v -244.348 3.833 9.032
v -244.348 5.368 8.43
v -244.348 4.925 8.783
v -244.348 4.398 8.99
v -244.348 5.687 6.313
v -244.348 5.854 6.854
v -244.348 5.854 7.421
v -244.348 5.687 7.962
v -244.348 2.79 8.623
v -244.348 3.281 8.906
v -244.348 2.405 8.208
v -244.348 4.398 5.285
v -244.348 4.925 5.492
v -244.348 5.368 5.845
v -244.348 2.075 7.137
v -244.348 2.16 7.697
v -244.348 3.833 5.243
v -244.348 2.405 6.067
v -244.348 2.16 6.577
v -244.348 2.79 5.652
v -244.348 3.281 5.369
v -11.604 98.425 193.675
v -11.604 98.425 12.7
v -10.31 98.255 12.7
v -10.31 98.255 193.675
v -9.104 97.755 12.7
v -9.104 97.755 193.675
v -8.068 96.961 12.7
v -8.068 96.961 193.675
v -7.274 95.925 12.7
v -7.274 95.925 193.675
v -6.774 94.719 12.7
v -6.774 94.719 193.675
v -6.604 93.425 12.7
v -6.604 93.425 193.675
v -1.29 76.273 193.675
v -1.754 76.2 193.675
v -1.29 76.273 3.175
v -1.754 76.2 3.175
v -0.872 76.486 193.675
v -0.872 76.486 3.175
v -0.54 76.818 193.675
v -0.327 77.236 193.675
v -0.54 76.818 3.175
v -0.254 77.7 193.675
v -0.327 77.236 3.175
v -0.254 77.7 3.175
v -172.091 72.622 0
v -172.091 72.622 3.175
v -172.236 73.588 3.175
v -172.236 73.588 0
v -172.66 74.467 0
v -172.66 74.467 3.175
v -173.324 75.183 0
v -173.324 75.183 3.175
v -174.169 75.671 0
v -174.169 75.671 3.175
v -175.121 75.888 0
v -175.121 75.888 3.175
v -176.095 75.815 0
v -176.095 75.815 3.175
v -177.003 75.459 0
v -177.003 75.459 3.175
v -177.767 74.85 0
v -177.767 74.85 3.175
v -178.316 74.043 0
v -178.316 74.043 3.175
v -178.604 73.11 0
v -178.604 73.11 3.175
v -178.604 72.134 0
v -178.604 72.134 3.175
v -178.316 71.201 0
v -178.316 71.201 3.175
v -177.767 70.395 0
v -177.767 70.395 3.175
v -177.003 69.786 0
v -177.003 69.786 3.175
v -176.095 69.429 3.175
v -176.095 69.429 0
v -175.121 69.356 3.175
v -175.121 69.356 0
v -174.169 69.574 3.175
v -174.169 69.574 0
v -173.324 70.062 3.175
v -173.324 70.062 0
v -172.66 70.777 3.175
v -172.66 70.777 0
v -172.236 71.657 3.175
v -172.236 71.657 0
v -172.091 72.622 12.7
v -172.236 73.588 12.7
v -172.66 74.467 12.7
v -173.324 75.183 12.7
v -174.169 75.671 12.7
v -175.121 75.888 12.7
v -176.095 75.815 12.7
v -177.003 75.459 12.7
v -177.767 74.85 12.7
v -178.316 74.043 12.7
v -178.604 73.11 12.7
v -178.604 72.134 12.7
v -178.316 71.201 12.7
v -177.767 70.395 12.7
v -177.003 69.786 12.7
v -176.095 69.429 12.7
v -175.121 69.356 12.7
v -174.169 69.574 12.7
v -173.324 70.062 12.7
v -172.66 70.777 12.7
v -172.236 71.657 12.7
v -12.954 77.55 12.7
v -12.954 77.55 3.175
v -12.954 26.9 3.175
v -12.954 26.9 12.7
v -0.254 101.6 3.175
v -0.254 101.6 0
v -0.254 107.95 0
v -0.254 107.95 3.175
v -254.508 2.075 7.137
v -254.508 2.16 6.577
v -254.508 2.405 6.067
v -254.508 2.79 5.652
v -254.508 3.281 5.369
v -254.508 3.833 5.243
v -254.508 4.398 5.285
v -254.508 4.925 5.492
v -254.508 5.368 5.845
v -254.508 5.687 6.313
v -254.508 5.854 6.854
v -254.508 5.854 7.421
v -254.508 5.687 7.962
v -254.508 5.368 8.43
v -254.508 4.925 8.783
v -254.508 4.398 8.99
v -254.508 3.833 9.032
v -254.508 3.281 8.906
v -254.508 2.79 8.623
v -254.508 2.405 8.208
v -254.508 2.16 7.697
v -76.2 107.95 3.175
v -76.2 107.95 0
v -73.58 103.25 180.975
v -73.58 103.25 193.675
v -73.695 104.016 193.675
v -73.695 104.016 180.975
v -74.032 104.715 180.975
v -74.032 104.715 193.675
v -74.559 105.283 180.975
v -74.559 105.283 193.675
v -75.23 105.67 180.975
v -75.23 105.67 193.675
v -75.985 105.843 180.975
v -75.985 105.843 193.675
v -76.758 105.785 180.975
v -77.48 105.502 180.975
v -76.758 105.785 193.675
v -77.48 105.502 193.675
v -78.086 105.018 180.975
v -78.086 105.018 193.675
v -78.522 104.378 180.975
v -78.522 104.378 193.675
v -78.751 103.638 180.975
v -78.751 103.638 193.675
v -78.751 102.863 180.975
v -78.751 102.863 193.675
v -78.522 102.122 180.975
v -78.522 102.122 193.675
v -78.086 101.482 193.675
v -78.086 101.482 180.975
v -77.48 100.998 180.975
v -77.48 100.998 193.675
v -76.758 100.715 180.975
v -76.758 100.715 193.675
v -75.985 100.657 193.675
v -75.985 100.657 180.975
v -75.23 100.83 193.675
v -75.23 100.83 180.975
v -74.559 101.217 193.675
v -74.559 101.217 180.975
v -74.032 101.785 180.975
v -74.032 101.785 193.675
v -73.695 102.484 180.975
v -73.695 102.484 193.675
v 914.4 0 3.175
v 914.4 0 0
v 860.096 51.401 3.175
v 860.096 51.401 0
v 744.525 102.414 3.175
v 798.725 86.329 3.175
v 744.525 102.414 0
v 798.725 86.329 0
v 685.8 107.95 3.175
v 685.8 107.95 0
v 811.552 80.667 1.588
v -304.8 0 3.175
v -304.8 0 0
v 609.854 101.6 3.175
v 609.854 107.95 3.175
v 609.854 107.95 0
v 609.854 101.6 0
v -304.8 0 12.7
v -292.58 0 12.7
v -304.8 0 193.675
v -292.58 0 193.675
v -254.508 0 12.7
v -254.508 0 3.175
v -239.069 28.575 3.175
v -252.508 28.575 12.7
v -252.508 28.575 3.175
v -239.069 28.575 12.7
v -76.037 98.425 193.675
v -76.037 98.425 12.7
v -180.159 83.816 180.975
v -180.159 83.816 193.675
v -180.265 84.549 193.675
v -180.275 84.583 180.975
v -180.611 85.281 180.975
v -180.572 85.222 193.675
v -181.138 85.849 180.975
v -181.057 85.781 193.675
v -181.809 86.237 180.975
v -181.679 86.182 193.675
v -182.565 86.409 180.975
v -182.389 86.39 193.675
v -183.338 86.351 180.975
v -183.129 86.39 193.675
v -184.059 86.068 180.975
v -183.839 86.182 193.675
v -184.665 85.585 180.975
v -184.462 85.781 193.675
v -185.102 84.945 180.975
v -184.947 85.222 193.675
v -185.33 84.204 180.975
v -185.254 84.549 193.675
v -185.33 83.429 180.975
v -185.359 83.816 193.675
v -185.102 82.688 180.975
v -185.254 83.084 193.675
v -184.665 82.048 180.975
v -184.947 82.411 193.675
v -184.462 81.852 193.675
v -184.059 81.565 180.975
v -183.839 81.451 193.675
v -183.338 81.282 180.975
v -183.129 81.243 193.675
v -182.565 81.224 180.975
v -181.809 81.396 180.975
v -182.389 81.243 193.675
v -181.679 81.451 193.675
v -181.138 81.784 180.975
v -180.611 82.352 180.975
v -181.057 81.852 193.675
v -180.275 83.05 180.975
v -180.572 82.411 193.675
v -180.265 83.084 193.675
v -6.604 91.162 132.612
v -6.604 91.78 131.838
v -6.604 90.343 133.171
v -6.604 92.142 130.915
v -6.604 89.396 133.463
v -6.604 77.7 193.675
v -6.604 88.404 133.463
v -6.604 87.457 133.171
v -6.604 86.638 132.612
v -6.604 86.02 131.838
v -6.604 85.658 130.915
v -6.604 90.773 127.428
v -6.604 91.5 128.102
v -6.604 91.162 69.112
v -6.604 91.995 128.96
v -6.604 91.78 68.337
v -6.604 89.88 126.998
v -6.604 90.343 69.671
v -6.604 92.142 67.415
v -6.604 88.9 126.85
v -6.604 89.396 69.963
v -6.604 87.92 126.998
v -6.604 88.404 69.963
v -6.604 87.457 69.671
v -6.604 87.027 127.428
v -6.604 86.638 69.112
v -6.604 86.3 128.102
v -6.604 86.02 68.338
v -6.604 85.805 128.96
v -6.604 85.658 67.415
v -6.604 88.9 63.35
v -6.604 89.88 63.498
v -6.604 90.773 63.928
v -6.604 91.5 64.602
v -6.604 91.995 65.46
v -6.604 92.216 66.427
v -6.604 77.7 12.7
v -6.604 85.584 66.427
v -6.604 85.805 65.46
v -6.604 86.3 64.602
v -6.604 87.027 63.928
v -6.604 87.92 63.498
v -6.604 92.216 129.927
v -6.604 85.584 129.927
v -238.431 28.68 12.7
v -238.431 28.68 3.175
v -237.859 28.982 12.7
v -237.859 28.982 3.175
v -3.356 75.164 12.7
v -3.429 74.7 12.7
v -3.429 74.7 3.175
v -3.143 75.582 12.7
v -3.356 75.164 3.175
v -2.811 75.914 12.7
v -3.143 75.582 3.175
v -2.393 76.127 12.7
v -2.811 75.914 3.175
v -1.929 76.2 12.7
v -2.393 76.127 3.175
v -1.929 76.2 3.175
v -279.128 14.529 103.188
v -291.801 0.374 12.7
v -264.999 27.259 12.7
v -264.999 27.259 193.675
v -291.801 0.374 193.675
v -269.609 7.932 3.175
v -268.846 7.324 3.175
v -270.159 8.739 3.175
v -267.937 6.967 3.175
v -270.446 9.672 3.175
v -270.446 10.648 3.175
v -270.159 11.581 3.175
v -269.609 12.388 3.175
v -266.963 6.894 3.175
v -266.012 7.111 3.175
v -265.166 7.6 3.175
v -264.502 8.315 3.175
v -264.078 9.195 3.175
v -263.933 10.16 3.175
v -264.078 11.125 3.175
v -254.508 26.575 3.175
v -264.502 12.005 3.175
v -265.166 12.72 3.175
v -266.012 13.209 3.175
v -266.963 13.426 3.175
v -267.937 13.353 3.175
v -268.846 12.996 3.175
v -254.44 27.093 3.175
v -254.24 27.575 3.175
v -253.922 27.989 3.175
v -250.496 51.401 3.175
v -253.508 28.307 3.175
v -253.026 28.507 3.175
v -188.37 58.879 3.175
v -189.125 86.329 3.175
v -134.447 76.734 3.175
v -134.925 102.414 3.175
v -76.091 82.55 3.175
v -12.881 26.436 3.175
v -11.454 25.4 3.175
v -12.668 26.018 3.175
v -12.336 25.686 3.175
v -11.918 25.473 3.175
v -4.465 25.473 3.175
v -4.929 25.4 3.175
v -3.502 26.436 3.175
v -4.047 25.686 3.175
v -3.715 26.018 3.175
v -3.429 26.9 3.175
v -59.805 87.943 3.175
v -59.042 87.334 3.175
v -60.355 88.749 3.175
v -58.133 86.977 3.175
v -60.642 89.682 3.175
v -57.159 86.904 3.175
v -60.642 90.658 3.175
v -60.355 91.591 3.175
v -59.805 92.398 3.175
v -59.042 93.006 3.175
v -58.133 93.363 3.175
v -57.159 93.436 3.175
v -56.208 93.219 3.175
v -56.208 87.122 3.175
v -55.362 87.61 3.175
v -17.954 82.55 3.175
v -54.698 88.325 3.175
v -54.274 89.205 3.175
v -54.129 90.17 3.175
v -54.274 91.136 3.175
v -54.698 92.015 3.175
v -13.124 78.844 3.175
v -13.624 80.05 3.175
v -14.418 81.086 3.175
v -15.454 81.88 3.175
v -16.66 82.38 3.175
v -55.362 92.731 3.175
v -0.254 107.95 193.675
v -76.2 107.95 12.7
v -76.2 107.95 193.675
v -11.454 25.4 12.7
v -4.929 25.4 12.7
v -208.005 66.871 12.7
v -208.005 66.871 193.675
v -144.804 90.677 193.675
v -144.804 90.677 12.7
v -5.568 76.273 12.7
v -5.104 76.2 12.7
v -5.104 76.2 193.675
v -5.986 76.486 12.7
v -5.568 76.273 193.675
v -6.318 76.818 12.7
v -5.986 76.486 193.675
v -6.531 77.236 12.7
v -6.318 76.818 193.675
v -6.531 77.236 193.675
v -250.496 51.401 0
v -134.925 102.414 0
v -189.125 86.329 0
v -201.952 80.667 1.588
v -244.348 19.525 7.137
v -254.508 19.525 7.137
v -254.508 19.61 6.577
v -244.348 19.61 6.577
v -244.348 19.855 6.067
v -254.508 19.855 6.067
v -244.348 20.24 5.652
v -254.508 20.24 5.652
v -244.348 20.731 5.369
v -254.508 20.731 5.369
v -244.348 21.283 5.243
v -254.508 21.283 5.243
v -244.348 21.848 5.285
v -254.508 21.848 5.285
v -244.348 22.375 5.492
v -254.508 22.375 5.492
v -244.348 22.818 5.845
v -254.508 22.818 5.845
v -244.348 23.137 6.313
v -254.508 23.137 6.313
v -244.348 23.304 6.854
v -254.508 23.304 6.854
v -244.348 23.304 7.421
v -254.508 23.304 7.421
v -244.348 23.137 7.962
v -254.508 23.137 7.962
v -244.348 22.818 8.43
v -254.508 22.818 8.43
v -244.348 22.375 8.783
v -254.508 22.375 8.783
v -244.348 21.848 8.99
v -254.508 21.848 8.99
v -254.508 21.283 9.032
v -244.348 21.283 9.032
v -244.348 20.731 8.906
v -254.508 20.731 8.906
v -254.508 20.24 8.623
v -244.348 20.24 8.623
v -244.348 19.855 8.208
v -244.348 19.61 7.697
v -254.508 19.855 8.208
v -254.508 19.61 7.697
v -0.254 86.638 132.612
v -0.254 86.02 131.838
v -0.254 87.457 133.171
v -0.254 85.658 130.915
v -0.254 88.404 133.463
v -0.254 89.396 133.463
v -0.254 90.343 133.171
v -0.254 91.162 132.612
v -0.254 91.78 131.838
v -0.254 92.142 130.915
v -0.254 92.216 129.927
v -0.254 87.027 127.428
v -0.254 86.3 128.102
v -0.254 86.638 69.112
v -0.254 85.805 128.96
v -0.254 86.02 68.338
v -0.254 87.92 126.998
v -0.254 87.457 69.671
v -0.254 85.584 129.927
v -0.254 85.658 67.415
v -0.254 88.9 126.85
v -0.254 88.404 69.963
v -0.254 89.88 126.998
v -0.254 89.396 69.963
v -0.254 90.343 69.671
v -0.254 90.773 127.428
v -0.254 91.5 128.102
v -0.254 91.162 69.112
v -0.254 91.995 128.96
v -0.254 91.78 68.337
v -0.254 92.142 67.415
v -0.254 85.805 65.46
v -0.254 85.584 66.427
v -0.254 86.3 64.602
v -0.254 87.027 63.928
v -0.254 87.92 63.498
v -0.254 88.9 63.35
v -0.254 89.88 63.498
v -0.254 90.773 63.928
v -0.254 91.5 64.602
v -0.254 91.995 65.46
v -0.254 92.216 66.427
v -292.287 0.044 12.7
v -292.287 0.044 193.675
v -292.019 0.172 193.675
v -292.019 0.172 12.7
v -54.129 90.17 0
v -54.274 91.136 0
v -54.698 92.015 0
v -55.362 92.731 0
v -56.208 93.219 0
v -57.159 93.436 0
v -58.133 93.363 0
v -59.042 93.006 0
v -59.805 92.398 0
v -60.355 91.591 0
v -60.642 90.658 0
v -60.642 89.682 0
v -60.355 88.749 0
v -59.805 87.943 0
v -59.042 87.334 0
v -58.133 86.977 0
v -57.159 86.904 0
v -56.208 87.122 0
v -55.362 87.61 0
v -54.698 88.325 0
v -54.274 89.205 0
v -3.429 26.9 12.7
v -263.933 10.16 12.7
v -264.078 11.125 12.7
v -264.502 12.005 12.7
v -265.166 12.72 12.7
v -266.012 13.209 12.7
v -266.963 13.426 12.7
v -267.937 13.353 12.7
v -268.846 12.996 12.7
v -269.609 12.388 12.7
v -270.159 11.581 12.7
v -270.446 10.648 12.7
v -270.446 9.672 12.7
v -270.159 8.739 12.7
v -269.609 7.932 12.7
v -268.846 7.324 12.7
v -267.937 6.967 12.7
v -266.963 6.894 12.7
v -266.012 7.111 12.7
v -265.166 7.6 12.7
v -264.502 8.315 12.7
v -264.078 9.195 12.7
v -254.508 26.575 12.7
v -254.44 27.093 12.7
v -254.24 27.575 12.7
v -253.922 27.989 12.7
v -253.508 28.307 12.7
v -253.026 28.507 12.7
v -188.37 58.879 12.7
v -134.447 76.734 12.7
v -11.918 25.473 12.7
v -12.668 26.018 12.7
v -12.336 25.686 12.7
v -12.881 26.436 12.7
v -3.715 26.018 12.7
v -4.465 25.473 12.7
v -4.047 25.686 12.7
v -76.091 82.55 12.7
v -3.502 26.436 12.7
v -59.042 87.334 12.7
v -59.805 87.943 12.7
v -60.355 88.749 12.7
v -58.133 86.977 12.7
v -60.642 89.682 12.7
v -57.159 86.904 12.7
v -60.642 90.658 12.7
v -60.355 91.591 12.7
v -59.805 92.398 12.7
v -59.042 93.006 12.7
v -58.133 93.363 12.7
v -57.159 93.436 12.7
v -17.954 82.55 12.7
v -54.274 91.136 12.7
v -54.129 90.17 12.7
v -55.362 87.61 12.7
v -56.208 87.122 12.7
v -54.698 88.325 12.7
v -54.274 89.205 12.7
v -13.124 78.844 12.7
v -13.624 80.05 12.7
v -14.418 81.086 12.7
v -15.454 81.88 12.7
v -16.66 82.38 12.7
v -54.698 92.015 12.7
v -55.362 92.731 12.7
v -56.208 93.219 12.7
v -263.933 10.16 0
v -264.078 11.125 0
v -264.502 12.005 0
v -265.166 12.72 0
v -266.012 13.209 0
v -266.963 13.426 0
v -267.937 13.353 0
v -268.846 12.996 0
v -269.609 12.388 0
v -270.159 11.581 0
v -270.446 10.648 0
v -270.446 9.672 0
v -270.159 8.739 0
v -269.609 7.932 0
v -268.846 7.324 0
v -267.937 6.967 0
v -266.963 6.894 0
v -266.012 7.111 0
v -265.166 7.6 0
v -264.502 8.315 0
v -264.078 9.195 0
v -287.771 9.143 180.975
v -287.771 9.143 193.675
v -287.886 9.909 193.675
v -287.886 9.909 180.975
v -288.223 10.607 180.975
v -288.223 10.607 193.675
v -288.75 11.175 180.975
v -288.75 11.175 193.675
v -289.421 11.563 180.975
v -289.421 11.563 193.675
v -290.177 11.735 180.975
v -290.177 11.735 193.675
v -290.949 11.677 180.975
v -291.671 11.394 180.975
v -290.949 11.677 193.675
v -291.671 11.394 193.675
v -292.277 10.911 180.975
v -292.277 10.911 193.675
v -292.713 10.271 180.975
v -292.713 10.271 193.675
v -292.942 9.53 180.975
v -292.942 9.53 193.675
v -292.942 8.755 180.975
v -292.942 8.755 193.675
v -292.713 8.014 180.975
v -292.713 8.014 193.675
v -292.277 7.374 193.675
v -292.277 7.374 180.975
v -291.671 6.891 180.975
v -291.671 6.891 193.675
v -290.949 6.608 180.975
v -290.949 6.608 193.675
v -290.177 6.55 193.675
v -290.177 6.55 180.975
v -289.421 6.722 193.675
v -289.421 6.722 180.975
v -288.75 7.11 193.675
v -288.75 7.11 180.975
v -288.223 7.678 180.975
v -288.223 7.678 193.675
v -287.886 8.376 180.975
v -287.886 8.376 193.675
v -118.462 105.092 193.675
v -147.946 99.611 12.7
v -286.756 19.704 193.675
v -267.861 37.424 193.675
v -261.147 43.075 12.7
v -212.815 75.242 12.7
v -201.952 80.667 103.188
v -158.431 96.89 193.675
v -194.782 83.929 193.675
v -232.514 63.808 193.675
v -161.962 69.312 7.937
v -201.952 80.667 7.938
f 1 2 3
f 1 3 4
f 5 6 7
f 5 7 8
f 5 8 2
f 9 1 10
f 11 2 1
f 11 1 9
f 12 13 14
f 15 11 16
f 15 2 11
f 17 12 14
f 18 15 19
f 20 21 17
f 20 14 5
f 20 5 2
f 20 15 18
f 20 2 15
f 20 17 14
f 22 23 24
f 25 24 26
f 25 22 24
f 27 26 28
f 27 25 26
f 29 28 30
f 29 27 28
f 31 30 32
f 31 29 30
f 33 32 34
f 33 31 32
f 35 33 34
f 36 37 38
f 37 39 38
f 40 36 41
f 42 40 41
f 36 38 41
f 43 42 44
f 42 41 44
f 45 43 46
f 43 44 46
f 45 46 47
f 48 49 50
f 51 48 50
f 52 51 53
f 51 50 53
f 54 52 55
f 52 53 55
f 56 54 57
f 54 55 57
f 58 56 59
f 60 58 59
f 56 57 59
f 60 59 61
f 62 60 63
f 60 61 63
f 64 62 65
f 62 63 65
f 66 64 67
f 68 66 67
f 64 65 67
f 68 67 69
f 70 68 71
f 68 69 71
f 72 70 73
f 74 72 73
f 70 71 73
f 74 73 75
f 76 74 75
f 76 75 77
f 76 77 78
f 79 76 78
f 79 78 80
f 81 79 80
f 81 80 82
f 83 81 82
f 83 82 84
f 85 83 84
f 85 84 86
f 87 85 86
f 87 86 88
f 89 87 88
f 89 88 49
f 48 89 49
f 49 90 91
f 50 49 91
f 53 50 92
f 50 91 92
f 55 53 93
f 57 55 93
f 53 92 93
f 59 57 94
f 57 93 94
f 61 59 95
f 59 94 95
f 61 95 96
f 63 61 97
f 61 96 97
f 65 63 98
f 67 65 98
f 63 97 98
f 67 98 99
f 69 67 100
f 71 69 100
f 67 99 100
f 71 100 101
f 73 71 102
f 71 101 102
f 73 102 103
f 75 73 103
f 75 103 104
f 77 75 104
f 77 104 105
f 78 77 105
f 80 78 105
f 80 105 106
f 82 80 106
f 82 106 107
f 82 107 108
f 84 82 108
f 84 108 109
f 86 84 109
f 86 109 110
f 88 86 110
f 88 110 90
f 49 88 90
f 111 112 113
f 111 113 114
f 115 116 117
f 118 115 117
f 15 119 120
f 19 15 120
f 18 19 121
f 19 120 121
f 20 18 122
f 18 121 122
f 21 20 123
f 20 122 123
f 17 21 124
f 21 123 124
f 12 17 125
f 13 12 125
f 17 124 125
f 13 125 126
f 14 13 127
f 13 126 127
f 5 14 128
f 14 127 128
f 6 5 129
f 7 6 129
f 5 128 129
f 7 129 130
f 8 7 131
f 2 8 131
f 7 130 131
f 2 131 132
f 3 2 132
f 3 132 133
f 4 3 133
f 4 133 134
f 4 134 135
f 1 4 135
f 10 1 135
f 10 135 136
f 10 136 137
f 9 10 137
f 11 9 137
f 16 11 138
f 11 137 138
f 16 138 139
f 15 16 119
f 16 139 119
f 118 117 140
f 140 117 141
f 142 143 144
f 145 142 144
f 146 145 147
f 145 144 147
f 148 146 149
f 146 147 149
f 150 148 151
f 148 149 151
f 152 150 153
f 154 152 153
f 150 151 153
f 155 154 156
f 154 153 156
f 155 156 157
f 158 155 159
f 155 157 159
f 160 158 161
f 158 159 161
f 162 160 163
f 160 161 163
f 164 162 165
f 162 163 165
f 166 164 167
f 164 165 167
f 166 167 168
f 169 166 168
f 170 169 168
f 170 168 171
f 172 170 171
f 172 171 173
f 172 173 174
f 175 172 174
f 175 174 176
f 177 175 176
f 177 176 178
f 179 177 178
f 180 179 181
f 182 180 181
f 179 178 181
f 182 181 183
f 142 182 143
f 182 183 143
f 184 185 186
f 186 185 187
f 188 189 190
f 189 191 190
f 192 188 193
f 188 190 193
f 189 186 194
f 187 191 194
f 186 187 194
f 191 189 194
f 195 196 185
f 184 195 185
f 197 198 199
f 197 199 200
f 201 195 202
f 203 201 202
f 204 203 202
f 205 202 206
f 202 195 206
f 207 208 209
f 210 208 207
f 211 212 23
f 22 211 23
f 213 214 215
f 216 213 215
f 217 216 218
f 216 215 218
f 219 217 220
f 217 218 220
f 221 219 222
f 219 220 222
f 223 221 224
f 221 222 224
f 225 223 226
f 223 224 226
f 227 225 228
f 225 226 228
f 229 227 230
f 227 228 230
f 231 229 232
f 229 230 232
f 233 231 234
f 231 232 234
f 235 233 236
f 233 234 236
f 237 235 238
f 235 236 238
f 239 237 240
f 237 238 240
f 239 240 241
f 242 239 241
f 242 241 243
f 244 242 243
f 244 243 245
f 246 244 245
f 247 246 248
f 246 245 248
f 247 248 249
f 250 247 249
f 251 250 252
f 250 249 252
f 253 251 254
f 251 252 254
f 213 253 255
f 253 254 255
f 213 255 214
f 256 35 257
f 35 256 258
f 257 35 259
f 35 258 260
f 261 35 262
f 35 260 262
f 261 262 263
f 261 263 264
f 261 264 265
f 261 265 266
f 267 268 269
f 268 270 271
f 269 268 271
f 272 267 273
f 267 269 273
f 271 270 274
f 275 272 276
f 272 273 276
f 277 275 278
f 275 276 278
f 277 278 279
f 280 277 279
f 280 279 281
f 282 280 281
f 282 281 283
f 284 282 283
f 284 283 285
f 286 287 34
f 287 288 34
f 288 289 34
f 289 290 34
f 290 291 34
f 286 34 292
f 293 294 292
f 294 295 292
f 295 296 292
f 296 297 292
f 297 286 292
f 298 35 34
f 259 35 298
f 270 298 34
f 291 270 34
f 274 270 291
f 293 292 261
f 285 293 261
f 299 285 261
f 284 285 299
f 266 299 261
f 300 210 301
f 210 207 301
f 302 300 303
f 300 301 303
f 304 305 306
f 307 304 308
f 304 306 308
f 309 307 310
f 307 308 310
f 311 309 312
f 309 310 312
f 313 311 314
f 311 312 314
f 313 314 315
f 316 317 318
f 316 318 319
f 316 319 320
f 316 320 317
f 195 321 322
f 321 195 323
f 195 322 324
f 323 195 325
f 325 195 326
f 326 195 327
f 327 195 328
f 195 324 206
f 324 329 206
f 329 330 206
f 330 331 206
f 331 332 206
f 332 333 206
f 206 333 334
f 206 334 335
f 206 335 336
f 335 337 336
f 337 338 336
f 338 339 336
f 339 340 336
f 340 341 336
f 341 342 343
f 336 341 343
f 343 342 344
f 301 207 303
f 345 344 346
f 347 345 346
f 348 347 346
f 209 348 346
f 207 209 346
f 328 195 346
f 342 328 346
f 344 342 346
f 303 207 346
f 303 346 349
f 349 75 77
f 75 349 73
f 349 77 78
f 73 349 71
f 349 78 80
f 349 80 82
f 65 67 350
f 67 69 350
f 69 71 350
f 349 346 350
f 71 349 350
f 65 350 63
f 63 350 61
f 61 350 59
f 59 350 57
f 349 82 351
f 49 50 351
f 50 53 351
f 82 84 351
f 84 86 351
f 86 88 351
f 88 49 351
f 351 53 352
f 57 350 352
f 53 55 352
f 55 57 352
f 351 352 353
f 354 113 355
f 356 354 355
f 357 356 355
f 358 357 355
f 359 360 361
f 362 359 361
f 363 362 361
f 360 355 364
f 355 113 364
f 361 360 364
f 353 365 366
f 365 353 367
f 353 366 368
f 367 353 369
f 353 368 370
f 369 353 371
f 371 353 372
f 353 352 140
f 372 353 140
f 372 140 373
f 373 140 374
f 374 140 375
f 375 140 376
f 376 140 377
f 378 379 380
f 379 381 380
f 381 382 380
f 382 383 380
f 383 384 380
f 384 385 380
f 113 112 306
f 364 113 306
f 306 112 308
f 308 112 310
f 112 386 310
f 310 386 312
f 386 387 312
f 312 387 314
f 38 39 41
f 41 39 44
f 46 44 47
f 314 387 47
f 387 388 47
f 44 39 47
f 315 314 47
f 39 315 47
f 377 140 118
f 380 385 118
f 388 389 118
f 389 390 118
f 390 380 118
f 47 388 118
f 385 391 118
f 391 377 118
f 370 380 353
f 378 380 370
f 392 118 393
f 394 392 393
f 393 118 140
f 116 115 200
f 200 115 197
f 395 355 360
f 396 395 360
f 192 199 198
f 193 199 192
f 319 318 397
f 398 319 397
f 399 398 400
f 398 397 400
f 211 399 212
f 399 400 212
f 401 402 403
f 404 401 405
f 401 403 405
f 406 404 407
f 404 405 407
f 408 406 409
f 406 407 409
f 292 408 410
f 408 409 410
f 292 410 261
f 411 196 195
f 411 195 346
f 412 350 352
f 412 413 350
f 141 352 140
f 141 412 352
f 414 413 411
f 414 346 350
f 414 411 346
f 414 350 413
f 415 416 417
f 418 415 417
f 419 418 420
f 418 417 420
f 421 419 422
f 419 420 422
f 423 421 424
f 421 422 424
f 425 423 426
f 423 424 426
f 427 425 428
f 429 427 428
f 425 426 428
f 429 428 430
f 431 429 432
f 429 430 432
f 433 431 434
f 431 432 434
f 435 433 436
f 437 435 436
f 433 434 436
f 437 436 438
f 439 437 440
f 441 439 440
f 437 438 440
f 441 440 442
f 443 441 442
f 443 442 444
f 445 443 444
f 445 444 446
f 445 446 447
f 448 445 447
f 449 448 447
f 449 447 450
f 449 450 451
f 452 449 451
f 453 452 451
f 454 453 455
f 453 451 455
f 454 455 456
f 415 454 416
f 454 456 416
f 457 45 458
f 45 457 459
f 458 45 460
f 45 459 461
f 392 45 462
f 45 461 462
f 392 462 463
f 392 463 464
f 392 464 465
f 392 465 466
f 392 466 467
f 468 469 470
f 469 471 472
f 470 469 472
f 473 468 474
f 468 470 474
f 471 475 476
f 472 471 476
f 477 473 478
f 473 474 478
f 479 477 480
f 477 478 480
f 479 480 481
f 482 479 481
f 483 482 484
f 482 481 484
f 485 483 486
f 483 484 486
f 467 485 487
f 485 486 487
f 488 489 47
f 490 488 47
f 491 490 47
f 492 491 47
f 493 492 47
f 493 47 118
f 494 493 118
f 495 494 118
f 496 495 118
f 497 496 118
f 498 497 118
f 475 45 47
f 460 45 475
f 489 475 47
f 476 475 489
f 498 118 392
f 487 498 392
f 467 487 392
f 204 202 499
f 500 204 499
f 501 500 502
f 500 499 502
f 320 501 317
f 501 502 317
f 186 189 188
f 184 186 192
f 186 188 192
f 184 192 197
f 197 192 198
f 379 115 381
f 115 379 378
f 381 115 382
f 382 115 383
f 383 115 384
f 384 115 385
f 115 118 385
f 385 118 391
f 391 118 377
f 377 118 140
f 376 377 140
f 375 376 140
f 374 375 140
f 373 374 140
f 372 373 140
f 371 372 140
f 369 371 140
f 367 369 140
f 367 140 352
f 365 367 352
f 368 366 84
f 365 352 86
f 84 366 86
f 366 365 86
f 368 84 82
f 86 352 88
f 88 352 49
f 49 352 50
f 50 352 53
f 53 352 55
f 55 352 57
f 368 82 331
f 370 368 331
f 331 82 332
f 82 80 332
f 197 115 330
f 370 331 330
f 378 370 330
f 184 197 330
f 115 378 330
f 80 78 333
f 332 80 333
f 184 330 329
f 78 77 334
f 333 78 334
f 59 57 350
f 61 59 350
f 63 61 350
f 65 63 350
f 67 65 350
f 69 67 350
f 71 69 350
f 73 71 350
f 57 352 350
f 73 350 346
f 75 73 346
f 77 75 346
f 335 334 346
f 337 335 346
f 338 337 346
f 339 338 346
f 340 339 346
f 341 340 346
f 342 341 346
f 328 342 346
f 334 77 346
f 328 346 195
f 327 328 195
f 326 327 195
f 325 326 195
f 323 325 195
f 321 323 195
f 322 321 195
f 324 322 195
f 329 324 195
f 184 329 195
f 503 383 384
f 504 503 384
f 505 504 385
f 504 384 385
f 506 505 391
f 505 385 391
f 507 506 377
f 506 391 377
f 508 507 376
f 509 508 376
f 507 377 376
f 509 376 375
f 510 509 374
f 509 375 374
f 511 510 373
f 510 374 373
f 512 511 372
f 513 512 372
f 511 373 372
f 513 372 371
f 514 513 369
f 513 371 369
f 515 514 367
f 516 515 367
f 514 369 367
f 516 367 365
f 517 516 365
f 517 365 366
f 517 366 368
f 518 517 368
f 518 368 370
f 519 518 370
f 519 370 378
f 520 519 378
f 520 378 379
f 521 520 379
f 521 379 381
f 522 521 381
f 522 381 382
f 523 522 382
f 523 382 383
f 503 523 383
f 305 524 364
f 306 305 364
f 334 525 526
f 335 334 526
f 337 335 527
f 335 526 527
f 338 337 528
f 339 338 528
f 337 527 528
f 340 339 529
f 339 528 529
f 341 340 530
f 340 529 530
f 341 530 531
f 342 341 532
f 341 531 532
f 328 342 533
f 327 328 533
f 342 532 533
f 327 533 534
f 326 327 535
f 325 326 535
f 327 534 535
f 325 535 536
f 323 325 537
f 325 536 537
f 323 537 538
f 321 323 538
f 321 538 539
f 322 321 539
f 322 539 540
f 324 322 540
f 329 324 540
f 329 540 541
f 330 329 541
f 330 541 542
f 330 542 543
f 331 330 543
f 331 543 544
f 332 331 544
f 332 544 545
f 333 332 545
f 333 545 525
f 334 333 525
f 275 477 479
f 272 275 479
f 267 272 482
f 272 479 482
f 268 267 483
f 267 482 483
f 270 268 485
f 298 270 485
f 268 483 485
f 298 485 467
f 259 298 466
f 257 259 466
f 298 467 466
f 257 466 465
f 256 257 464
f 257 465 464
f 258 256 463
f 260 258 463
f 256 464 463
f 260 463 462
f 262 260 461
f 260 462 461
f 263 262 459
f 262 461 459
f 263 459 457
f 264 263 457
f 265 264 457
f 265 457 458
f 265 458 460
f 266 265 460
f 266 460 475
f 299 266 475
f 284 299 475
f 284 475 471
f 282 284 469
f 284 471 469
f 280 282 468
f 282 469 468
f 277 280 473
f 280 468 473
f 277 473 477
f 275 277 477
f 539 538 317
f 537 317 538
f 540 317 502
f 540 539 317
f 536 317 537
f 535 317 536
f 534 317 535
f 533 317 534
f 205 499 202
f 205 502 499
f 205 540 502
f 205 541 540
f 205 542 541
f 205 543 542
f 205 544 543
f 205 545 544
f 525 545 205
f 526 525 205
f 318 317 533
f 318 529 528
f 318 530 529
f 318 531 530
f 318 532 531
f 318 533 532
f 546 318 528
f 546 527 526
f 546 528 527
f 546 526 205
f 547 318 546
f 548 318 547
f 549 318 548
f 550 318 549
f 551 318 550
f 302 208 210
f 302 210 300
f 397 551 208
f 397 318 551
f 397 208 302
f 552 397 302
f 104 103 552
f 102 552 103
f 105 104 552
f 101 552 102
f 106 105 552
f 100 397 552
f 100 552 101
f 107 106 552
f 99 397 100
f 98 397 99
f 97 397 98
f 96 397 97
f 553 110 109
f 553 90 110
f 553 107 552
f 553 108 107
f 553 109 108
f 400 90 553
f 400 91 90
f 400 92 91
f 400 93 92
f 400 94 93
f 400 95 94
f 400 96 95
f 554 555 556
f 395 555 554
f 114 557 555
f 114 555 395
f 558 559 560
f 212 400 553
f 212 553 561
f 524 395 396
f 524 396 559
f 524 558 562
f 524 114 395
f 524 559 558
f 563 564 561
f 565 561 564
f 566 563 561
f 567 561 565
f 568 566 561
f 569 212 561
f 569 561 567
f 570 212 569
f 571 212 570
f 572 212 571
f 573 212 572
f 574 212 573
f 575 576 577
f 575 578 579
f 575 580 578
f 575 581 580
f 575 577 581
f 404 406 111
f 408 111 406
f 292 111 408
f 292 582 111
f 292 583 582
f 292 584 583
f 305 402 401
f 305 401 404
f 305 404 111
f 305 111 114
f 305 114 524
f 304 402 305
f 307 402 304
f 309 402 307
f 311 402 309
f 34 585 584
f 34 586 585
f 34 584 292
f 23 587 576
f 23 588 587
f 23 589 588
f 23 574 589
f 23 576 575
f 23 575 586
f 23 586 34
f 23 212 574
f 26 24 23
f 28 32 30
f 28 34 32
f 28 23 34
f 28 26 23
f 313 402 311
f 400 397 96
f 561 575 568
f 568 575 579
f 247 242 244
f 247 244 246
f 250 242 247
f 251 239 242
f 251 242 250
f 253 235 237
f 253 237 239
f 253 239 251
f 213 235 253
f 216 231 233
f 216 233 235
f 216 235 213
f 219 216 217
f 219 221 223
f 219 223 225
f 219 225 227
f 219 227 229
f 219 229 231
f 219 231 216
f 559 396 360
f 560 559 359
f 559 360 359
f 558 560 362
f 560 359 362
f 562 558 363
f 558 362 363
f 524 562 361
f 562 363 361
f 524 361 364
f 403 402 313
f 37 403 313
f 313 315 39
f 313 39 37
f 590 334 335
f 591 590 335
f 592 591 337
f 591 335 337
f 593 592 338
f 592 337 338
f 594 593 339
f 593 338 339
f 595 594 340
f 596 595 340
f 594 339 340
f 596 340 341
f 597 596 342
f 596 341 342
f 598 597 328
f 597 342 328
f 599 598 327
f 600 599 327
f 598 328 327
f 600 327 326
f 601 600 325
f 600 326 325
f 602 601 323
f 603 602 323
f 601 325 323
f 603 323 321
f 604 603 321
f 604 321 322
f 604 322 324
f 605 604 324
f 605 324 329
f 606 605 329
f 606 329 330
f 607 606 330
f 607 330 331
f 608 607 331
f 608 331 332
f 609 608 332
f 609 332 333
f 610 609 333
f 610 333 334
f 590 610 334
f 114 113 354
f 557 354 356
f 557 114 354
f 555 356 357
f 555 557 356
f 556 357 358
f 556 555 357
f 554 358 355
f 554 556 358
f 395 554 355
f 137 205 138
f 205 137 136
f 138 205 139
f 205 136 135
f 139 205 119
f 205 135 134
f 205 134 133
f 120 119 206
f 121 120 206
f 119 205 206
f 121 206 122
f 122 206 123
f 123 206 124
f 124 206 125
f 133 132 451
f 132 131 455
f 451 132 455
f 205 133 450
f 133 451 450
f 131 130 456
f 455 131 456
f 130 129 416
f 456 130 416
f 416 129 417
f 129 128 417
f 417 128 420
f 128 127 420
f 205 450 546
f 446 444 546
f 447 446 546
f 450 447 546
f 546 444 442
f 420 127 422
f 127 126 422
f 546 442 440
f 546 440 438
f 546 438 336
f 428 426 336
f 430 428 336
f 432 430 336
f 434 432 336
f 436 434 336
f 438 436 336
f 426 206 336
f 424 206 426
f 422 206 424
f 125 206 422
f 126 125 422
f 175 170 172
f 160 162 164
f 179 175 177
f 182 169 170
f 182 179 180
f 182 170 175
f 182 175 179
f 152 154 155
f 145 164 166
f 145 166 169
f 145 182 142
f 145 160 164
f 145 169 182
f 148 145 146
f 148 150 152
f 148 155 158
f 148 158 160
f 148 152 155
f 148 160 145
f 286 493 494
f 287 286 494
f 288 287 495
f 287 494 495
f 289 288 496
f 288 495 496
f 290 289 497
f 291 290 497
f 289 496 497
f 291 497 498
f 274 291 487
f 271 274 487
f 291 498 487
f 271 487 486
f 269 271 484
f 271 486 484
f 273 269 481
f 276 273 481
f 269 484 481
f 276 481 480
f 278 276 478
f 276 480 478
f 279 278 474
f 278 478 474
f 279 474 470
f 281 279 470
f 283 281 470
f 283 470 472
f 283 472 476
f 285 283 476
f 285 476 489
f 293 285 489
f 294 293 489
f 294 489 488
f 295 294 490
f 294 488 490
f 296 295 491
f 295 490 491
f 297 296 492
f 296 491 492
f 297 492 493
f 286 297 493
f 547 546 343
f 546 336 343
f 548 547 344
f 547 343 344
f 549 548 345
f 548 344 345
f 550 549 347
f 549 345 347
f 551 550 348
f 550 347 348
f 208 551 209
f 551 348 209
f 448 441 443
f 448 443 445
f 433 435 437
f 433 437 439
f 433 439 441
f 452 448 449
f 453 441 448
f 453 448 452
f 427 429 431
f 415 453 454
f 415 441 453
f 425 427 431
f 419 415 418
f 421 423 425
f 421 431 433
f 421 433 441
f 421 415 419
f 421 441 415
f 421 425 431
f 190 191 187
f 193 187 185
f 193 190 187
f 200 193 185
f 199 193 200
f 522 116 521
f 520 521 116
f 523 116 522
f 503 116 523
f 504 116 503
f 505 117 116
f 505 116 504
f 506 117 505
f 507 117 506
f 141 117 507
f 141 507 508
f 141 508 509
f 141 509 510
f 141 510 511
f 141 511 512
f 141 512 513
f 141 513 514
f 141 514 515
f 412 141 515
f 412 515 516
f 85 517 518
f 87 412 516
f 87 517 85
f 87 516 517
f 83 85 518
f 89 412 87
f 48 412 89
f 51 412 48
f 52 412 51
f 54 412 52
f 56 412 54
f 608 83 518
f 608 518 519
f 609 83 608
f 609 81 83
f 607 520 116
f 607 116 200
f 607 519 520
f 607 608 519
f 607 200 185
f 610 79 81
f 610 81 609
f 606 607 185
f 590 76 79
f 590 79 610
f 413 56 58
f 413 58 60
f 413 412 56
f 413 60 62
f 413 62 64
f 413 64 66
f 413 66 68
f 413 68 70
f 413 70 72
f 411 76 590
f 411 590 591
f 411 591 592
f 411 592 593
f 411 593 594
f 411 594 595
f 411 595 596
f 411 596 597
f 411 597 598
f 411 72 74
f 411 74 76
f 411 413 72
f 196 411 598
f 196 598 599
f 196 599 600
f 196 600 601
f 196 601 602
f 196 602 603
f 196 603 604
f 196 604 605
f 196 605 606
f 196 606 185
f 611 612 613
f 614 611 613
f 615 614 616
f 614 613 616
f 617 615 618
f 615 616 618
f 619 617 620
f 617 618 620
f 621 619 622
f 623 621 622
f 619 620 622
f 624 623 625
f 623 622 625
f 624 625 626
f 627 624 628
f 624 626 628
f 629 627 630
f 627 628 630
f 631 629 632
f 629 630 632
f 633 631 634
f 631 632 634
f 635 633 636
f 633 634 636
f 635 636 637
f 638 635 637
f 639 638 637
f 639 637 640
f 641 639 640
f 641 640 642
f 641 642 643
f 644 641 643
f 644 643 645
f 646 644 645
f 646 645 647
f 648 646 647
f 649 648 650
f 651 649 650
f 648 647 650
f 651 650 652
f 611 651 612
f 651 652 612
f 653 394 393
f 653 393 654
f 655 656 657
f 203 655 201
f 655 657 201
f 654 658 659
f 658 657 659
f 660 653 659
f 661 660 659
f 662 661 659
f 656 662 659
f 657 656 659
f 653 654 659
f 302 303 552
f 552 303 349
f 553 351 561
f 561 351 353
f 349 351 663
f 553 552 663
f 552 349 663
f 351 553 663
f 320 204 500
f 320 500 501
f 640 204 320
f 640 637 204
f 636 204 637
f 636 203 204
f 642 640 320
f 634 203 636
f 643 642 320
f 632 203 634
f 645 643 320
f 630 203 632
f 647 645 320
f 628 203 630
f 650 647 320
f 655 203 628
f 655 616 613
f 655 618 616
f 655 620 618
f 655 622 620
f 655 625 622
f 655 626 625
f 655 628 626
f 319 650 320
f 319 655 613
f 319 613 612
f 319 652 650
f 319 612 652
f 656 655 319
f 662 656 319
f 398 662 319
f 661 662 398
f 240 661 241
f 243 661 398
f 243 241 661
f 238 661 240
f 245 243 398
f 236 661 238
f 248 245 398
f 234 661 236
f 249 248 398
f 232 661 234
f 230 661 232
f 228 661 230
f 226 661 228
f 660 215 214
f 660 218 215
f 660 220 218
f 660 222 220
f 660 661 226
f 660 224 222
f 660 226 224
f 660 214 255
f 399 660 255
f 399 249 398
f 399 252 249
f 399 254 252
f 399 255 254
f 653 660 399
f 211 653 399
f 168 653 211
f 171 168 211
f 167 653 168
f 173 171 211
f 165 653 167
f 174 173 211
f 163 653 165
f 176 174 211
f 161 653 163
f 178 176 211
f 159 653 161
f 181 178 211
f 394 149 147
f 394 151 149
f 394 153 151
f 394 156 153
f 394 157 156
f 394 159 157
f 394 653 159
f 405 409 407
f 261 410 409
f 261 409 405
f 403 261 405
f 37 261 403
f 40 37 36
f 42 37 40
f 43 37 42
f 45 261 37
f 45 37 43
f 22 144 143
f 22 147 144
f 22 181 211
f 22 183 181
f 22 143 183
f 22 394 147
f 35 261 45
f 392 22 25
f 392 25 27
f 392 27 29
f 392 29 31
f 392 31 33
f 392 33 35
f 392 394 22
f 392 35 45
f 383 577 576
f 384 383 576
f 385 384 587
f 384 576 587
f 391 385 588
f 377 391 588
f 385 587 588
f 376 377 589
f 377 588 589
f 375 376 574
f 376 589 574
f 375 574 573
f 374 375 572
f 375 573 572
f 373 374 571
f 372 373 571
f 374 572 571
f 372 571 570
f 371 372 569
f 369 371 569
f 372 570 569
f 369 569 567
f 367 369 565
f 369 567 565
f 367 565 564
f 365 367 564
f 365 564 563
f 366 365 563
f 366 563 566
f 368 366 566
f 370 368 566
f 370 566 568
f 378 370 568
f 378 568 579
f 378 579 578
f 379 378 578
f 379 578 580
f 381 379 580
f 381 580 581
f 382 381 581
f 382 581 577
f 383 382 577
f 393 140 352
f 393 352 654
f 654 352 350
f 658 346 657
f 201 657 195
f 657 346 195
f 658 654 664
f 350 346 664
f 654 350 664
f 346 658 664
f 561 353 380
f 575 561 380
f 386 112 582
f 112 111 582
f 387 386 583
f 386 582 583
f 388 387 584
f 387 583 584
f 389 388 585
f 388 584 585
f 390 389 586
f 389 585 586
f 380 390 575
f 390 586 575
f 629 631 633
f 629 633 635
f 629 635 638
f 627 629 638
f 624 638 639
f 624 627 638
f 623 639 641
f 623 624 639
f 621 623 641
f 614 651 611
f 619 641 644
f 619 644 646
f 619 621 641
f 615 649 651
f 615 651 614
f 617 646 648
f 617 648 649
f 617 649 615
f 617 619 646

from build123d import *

# Parameters (mm, degrees)
BOSS_EXTRUDE1_DEPTH = 3.175
CUT_EXTRUDE1_DEPTH  = 921.755474233
BOSS_EXTRUDE2_DEPTH = 9.525
BOSS_EXTRUDE3_DEPTH = 180.975
SKETCH6_W           = 28.082698006
SKETCH6_H           = 28.575
CUT_EXTRUDE2_DEPTH  = 9.525
SKETCH7_R           = 3.275
CUT_EXTRUDE3_DEPTH  = 939.366939617
SKETCH8_R           = 3.325
CUT_EXTRUDE5_DEPTH  = 6.35
SKETCH9_R           = 2.6
SKETCH9_R_2         = 2.600000001
CUT_EXTRUDE6_DEPTH  = 12.7
SKETCH11_R          = 1.9
BOSS_EXTRUDE5_DEPTH = 10.16
SKETCH14_W          = 12.7
SKETCH14_H          = 9.525
BOSS_EXTRUDE8_DEPTH = 57.150234853
SKETCH17_W          = 9.525
SKETCH17_H          = 50.8
CUT_EXTRUDE9_DEPTH  = 3.175
FILLET1_R           = 5
FILLET2_R           = 2
FILLET3_R           = 1
FILLET8_R           = 5
FILLET9_R           = 1.5
FILLET10_R          = 1.5


# Read off the part's stored shape, not the designer's step: Split2
with BuildPart() as part:
    # Sketch1 → Boss-Extrude1 (new body)
    with BuildSketch(Plane.XY):
        with BuildLine():
            Line((0, 0), (-304.8, 0))
            add(Edge.make_bspline(
                [(-304.8, 0), (-213.403997347, 107.359981337), (-76.2, 107.95)],
                knots=[0, 0, 0, 1, 1, 1], degree=2))
            Line((-76.2, 107.95), (0, 107.95))
            Line((0, 107.95), (609.6, 107.95))
            Line((609.6, 107.95), (685.8, 107.95))
            add(Edge.make_bspline(
                [(914.4, 0), (823.003997347, 107.359981337), (685.8, 107.95)],
                knots=[0, 0, 0, 1, 1, 1], degree=2))
            Line((914.4, 0), (609.6, 0))
            Line((609.6, 0), (0, 0))
        make_face()
    extrude(amount=BOSS_EXTRUDE1_DEPTH)

    # Sketch2 → Cut-Extrude1 (cut, through all)
    with BuildSketch(Plane.XY.offset(3.175)):
        Polygon((0, 107.95), (609.6, 107.95), (609.854, 107.95), (609.854, 101.6), (609.6, 101.6), (0, 101.6), (-0.254, 101.6), (-0.254, 107.95), align=None)
    extrude(amount=-CUT_EXTRUDE1_DEPTH, mode=Mode.SUBTRACT)

    # Sketch3 → Boss-Extrude2 (add)
    with BuildSketch(Plane.XY.offset(3.175)):
        with BuildLine():
            Line((-304.8, 0), (-254.508, 0))
            Line((-254.508, 0), (-254.508, 15.344828713))
            add(Edge.make_bspline(
                [(-254.508, 15.344828713), (-177.798332328, 82.893238953), (-76.090773332, 82.550234853)],
                knots=[0, 0, 0, 1, 1, 1], degree=2))
            Line((-76.090773332, 82.550234853), (-6.604, 82.550234853))
            Line((-6.604, 82.550234853), (-6.604, 76.2))
            Line((-6.604, 76.2), (-0.254, 76.2))
            Line((-0.254, 76.2), (-0.254, 107.95))
            Line((-0.254, 107.95), (-76.2, 107.95))
            add(Edge.make_bspline(
                [(-76.2, 107.95), (-213.403997347, 107.359981337), (-304.8, 0)],
                knots=[0, 0, 0, 1, 1, 1], degree=2))
        make_face()
    extrude(amount=BOSS_EXTRUDE2_DEPTH)

    # Sketch5 → Boss-Extrude3 (add)
    with BuildSketch(Plane.XY.offset(12.7)):
        with BuildLine():
            Line((-304.8, 0), (-292.1, 0))
            add(Edge.make_bspline(
                [(-264.999310143, 27.259023461), (-280.043189094, 15.090688978), (-292.1, 0)],
                knots=[0, 0, 0, 1, 1, 1], degree=2))
            add(Edge.make_bspline(
                [(-264.999310143, 27.259023461), (-263.324912471, 28.733451708), (-259.93755133, 31.654735884), (-253.107003874, 37.29977015), (-244.418964995, 44.024448353), (-233.76867915, 51.547177424), (-219.265929961, 60.847632169), (-200.578257731, 71.093058658), (-177.28374589, 81.152323376), (-153.155325898, 88.956116173), (-132.386582303, 93.571898544), (-115.39333326, 96.133277835), (-102.464741628, 97.490056952), (-91.537068573, 98.151901873), (-82.713415498, 98.401217113), (-78.259134389, 98.432637828), (-76.037235922, 98.425144577)],
                knots=[0.49783188, 0.49783188, 0.49783188, 0.49783188, 0.497964782, 0.498097684, 0.498363488, 0.498629292, 0.498895096, 0.499426703, 0.499958311, 0.500489919, 0.501021527, 0.501287331, 0.501553135, 0.501818938, 0.50195184, 0.502084742, 0.502084742, 0.502084742, 0.502084742], degree=3))
            Line((-76.037235922, 98.425144577), (-6.604, 98.425144577))
            Line((-6.604, 98.425144577), (-6.604, 82.550234853))
            Line((-6.604, 82.550234853), (-6.604, 76.2))
            Line((-6.604, 76.2), (-0.254, 76.2))
            Line((-0.254, 76.2), (-0.254, 107.95))
            Line((-0.254, 107.95), (-76.199999999, 107.95))
            add(Edge.make_bspline(
                [(-76.199999999, 107.95), (-213.403997347, 107.359981337), (-304.8, 0)],
                knots=[0, 0, 0, 1, 1, 1], degree=2))
        make_face()
    extrude(amount=BOSS_EXTRUDE3_DEPTH)

    # Sketch6 → Cut-Extrude2 (cut)
    with BuildSketch(Plane.XY.offset(12.7)):
        with Locations((-240.466650997, 14.2875)):
            Rectangle(SKETCH6_W, SKETCH6_H)
    extrude(amount=-CUT_EXTRUDE2_DEPTH, mode=Mode.SUBTRACT)

    # Sketch7 → Cut-Extrude3 (cut, through all)
    with BuildSketch(Plane.XY.offset(12.7)):
        with Locations((-267.208, 10.16)):
            Circle(SKETCH7_R)
        with Locations((-175.365808452, 72.622269579)):
            Circle(SKETCH7_R)
        with Locations((-57.404, 90.17019152)):
            Circle(SKETCH7_R)
    extrude(amount=-CUT_EXTRUDE3_DEPTH, mode=Mode.SUBTRACT)

    # Sketch8 → Cut-Extrude5 (cut)
    with BuildSketch(Plane(origin=(-0.254, 0, 0), x_dir=(0, 0, -1), z_dir=(1, 0, 0))):
        with Locations((-66.675, 88.9)):
            Circle(SKETCH8_R)
        with Locations((-130.175, 88.9)):
            Circle(SKETCH8_R)
    extrude(amount=-CUT_EXTRUDE5_DEPTH, mode=Mode.SUBTRACT)

    # Sketch9 → Cut-Extrude6 (cut)
    with BuildSketch(Plane.XY.offset(193.675)):
        with Locations((-290.370830702, 9.142552388)):
            Circle(SKETCH9_R)
        with Locations((-182.759356376, 83.816480509)):
            Circle(SKETCH9_R)
        with Locations((-76.179788765, 103.250043457)):
            Circle(SKETCH9_R_2)
    extrude(amount=-CUT_EXTRUDE6_DEPTH, mode=Mode.SUBTRACT)

    # Sketch11 → Boss-Extrude5 (add)
    with BuildSketch(Plane(origin=(-254.508, 2e-09, 0), x_dir=(0, 0, -1), z_dir=(1.0, -6.037741648177811e-12, 0))):
        with Locations(Location((-7.1374, 3.975099998, 0), (0, 0, 270))):
            Circle(SKETCH11_R)
        with Locations(Location((-7.1374, 21.425099998, 0), (0, 0, 270))):
            Circle(SKETCH11_R)
    extrude(amount=BOSS_EXTRUDE5_DEPTH)

    # Sketch14 → Boss-Extrude8 (add)
    with BuildSketch(Plane.XZ.offset(-82.550234853)):
        with Locations((-6.604, 7.9375)):
            Rectangle(SKETCH14_W, SKETCH14_H)
    extrude(amount=BOSS_EXTRUDE8_DEPTH)

    # Sketch17 → Cut-Extrude9 (cut)
    with BuildSketch(Plane(origin=(-0.254, 0, 0), x_dir=(0, 0, -1), z_dir=(1, 0, 0))):
        with Locations((-7.9375, 50.8)):
            Rectangle(SKETCH17_W, SKETCH17_H)
    extrude(amount=-CUT_EXTRUDE9_DEPTH, mode=Mode.SUBTRACT)

    # Fillet1
    fillet1_edges = [part.edges().sort_by_distance(p)[0] for p in [
        (-6.604, 98.425144577, 103.1875),
    ]]
    fillet(fillet1_edges, radius=FILLET1_R)

    # Fillet2
    fillet2_edges = [part.edges().sort_by_distance(p)[0] for p in [
        (-238.394170448, 28.575, 7.9375),
        (-254.508, 28.575, 7.9375),
    ]]
    fillet(fillet2_edges, radius=FILLET2_R)

    # Fillet3
    # the kernel refuses this fillet: 1 mm, written as the material it takes off along each edge
    with BuildSketch(Plane(origin=(-292.1, 0, 12.7), x_dir=(0.6252400597778598, 0.7804324875663354, 0), z_dir=(0, 0, 1))) as fillet3_piece_1:
        with BuildLine():
            CenterArc((0.480195921, 0.999999109), FILLET3_R, 218.699809372, 51.223710378)
            Line((-0.300236566, 0.374759049), (-0.315845216, 0.362254248))
            Line((-0.315845216, 0.362254248), (-0.01560865, -0.012504801))
            Line((-0.01560865, -0.012504801), (2.669e-05, -0.019999982))
            ThreePointArc((2.669e-05, -0.019999982), (0.239430546, -0.019840221), (0.478834393, -0.019999982))
            Line((0.478834393, -0.019999982), (0.478861089, 0))
        make_face()
    extrude(amount=180.975, mode=Mode.SUBTRACT)

    # Fillet8
    fillet8_edges = [part.edges().sort_by_distance(p)[0] for p in [
        (-12.954, 82.550234853, 7.9375),
    ]]
    fillet(fillet8_edges, radius=FILLET8_R)

    # Fillet9
    fillet9_edges = [part.edges().sort_by_distance(p)[0] for p in [
        (-12.954, 25.4, 7.9375),
        (-3.429, 25.4, 7.9375),
        (-6.604, 76.2, 103.1875),
        (-0.254, 76.2, 98.425),
    ]]
    fillet(fillet9_edges, radius=FILLET9_R)

    # Fillet10
    fillet10_edges = [part.edges().sort_by_distance(p)[0] for p in [
        (-3.429, 76.2, 7.9375),
    ]]
    fillet(fillet10_edges, radius=FILLET10_R)


with BuildPart() as body_2:
    # Split2: the piece on the far side of the plane
    add(part.part)
    split(bisect_by=Plane.XY.offset(3.175), keep=Keep.BOTTOM)


with BuildPart() as part_1:
    add(part.part)

    # Split2
    split(bisect_by=Plane.XY.offset(3.175), keep=Keep.TOP)


solid = Compound([body_2.part, part_1.part])
